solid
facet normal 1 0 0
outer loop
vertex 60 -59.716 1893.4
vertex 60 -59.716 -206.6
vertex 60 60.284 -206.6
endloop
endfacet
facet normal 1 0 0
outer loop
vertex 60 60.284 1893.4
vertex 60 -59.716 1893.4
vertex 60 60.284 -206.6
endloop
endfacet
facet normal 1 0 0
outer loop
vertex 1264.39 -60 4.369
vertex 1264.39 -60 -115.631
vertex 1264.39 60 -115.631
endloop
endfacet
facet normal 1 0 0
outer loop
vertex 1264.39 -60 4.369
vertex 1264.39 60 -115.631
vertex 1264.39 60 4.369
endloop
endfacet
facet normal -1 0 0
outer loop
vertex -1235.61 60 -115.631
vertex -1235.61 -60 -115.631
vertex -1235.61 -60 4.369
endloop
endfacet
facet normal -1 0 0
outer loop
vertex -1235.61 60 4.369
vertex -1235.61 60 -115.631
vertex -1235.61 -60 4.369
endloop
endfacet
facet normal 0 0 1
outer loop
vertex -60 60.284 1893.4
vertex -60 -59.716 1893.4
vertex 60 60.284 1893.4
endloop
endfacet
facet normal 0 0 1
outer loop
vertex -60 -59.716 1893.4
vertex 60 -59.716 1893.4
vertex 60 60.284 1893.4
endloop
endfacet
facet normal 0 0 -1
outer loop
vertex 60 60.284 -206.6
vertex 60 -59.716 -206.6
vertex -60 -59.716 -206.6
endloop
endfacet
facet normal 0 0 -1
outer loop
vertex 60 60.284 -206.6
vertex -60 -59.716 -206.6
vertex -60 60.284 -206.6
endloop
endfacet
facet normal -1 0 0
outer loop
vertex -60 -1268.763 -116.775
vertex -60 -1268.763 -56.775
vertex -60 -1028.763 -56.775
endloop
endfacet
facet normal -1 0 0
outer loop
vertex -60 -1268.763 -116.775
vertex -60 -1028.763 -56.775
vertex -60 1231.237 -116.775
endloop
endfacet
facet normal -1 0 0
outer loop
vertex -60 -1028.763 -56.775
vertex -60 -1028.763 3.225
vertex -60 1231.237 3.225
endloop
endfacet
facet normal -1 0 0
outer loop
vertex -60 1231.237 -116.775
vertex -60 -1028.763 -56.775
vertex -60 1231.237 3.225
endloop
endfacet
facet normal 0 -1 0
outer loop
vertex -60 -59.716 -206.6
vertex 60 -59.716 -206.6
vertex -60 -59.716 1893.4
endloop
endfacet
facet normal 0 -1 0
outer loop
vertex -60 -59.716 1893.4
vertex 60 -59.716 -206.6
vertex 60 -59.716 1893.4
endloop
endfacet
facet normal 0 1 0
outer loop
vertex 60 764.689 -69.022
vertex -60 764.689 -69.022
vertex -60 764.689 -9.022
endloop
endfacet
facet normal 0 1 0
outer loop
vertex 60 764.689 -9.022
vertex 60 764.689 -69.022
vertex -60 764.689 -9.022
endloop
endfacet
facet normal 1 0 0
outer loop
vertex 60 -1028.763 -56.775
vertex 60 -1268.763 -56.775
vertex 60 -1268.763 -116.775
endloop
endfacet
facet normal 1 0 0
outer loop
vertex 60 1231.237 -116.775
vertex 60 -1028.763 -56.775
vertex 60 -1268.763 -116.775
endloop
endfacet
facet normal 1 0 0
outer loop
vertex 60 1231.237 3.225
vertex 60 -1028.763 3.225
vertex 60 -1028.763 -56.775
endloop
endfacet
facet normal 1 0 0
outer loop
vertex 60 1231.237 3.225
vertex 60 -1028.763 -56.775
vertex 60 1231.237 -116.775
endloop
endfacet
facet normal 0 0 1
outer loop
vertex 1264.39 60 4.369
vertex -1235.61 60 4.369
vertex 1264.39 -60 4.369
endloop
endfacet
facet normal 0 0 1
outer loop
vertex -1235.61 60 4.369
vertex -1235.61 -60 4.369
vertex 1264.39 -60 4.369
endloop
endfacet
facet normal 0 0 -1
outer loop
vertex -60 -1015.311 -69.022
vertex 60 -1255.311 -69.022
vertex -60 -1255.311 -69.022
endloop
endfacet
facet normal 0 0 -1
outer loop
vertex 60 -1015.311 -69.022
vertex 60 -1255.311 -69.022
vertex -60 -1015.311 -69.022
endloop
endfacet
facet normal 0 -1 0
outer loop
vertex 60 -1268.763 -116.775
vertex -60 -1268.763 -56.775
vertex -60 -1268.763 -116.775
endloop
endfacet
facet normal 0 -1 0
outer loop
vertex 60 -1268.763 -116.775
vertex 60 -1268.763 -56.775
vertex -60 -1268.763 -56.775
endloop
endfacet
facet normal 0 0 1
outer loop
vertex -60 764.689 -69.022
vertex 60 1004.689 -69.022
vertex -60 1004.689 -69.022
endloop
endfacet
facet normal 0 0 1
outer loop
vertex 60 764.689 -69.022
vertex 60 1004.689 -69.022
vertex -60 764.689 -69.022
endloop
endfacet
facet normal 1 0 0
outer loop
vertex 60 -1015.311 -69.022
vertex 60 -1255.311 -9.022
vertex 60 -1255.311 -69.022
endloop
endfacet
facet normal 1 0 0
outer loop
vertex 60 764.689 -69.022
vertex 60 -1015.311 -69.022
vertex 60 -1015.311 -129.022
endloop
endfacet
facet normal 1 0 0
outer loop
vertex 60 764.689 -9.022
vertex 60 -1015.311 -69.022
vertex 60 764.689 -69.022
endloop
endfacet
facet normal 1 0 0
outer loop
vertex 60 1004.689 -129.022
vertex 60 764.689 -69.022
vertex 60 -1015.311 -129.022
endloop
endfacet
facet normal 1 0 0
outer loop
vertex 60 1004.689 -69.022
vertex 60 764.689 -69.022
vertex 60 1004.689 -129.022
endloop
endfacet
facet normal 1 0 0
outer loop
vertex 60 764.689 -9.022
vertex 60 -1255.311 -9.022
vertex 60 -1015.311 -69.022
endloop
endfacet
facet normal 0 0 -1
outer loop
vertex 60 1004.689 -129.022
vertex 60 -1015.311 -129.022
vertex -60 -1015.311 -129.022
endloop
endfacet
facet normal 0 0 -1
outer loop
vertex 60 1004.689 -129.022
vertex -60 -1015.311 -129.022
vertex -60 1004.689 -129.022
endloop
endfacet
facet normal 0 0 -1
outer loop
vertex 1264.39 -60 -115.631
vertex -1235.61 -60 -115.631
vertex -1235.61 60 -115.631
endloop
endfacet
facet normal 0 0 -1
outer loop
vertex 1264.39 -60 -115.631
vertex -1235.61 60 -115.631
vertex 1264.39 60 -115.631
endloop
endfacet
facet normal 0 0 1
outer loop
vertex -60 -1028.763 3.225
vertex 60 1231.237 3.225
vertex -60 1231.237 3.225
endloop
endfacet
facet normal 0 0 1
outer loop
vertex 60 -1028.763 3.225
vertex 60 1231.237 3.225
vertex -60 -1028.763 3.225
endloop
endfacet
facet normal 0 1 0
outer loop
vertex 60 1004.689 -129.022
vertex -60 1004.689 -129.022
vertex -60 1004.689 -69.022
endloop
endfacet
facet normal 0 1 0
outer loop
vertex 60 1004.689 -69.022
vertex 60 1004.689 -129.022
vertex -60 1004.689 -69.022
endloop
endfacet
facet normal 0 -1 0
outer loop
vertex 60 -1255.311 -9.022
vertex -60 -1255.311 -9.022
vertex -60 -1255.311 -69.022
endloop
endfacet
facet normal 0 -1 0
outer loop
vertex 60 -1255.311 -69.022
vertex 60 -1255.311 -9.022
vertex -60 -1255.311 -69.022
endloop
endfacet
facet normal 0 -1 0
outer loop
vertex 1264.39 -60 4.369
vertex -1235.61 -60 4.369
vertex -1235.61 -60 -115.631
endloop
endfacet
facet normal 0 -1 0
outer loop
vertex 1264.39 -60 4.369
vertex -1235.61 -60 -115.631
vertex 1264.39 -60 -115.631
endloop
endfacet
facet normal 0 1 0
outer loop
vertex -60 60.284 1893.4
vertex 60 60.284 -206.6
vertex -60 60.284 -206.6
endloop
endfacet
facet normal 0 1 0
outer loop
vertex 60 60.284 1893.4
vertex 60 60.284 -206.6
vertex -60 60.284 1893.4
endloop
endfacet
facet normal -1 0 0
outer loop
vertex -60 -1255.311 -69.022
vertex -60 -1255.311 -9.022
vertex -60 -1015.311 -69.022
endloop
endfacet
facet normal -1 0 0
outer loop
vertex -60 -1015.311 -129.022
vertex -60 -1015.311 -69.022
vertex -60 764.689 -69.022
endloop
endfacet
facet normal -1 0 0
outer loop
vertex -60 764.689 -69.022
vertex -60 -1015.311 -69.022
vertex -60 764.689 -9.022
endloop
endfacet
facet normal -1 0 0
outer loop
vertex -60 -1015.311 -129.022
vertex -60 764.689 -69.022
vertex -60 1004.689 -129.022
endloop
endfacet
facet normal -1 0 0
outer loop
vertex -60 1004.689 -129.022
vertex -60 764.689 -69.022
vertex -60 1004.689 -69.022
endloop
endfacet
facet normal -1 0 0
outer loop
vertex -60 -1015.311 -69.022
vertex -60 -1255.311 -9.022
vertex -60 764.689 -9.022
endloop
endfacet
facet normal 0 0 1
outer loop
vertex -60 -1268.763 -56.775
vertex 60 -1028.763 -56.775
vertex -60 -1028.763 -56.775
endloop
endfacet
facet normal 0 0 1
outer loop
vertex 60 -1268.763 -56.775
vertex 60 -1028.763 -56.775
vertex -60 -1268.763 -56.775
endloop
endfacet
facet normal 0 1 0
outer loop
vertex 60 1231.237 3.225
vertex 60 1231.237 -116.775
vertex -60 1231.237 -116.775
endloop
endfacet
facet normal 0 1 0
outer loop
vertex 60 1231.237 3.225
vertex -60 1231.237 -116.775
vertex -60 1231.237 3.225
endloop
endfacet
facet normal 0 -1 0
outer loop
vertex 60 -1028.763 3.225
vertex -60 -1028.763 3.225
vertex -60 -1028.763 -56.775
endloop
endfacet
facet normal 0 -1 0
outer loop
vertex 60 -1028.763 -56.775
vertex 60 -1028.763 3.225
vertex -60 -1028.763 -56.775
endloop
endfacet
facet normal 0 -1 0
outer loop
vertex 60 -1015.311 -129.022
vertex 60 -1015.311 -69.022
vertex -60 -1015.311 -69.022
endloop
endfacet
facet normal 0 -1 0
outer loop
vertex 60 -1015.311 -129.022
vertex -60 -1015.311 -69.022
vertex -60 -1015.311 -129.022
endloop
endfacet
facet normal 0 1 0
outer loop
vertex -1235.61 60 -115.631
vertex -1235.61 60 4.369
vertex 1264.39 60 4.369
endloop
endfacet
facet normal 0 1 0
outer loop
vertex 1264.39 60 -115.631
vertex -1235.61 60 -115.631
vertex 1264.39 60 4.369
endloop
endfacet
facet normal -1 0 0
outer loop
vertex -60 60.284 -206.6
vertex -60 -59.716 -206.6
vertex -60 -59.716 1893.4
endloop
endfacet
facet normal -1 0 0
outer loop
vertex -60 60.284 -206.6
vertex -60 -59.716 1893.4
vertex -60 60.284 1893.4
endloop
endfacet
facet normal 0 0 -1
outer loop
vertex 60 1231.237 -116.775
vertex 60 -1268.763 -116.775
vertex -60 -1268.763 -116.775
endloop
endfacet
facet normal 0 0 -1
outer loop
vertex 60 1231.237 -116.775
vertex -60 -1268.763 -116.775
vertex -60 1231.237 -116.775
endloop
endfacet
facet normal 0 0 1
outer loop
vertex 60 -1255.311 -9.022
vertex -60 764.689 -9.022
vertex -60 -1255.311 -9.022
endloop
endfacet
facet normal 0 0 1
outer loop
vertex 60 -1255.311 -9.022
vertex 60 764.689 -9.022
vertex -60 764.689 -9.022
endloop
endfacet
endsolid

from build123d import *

# Parameters (mm, degrees)
F1_DEPTH = 60
F3_DEPTH = 60
F4_W     = 2500
F4_H     = 120
F5_DEPTH = 60
F6_W     = 120
F6_H     = 2100
F7_DEPTH = 60


with BuildPart() as f1:
    # F0 (on Right) → F1 (new body, symmetric)
    with BuildSketch(Plane.YZ):
        Polygon((764.689085, -9.022395), (-1255.310915, -9.022395), (-1255.310915, -69.022395), (-1015.310915, -69.022395), (-1015.310915, -129.022395), (1004.689085, -129.022395), (1004.689085, -69.022395), (764.689085, -69.022395), align=None)
    extrude(amount=F1_DEPTH, both=True)


with BuildPart() as f3:
    # F2 (on Right) → F3 (new body, symmetric)
    with BuildSketch(Plane.YZ):
        Polygon((-1268.762529, -56.775315), (-1268.762529, -116.775315), (1231.237471, -116.775315), (1231.237471, 3.224685), (-1028.762529, 3.224685), (-1028.762529, -56.775315), align=None)
    extrude(amount=F3_DEPTH, both=True)


with BuildPart() as f5:
    # F4 (on Front) → F5 (new body, symmetric)
    with BuildSketch(Plane.XZ):
        with Locations((14.390022, -55.630816)):
            Rectangle(F4_W, F4_H)
    extrude(amount=F5_DEPTH, both=True)


with BuildPart() as f7:
    # F6 (on Right) → F7 (new body, symmetric)
    with BuildSketch(Plane.YZ):
        with Locations((0.283696, 843.399713)):
            Rectangle(F6_W, F6_H)
    extrude(amount=F7_DEPTH, both=True)


solid = Compound([f1.part, f3.part, f5.part, f7.part])
